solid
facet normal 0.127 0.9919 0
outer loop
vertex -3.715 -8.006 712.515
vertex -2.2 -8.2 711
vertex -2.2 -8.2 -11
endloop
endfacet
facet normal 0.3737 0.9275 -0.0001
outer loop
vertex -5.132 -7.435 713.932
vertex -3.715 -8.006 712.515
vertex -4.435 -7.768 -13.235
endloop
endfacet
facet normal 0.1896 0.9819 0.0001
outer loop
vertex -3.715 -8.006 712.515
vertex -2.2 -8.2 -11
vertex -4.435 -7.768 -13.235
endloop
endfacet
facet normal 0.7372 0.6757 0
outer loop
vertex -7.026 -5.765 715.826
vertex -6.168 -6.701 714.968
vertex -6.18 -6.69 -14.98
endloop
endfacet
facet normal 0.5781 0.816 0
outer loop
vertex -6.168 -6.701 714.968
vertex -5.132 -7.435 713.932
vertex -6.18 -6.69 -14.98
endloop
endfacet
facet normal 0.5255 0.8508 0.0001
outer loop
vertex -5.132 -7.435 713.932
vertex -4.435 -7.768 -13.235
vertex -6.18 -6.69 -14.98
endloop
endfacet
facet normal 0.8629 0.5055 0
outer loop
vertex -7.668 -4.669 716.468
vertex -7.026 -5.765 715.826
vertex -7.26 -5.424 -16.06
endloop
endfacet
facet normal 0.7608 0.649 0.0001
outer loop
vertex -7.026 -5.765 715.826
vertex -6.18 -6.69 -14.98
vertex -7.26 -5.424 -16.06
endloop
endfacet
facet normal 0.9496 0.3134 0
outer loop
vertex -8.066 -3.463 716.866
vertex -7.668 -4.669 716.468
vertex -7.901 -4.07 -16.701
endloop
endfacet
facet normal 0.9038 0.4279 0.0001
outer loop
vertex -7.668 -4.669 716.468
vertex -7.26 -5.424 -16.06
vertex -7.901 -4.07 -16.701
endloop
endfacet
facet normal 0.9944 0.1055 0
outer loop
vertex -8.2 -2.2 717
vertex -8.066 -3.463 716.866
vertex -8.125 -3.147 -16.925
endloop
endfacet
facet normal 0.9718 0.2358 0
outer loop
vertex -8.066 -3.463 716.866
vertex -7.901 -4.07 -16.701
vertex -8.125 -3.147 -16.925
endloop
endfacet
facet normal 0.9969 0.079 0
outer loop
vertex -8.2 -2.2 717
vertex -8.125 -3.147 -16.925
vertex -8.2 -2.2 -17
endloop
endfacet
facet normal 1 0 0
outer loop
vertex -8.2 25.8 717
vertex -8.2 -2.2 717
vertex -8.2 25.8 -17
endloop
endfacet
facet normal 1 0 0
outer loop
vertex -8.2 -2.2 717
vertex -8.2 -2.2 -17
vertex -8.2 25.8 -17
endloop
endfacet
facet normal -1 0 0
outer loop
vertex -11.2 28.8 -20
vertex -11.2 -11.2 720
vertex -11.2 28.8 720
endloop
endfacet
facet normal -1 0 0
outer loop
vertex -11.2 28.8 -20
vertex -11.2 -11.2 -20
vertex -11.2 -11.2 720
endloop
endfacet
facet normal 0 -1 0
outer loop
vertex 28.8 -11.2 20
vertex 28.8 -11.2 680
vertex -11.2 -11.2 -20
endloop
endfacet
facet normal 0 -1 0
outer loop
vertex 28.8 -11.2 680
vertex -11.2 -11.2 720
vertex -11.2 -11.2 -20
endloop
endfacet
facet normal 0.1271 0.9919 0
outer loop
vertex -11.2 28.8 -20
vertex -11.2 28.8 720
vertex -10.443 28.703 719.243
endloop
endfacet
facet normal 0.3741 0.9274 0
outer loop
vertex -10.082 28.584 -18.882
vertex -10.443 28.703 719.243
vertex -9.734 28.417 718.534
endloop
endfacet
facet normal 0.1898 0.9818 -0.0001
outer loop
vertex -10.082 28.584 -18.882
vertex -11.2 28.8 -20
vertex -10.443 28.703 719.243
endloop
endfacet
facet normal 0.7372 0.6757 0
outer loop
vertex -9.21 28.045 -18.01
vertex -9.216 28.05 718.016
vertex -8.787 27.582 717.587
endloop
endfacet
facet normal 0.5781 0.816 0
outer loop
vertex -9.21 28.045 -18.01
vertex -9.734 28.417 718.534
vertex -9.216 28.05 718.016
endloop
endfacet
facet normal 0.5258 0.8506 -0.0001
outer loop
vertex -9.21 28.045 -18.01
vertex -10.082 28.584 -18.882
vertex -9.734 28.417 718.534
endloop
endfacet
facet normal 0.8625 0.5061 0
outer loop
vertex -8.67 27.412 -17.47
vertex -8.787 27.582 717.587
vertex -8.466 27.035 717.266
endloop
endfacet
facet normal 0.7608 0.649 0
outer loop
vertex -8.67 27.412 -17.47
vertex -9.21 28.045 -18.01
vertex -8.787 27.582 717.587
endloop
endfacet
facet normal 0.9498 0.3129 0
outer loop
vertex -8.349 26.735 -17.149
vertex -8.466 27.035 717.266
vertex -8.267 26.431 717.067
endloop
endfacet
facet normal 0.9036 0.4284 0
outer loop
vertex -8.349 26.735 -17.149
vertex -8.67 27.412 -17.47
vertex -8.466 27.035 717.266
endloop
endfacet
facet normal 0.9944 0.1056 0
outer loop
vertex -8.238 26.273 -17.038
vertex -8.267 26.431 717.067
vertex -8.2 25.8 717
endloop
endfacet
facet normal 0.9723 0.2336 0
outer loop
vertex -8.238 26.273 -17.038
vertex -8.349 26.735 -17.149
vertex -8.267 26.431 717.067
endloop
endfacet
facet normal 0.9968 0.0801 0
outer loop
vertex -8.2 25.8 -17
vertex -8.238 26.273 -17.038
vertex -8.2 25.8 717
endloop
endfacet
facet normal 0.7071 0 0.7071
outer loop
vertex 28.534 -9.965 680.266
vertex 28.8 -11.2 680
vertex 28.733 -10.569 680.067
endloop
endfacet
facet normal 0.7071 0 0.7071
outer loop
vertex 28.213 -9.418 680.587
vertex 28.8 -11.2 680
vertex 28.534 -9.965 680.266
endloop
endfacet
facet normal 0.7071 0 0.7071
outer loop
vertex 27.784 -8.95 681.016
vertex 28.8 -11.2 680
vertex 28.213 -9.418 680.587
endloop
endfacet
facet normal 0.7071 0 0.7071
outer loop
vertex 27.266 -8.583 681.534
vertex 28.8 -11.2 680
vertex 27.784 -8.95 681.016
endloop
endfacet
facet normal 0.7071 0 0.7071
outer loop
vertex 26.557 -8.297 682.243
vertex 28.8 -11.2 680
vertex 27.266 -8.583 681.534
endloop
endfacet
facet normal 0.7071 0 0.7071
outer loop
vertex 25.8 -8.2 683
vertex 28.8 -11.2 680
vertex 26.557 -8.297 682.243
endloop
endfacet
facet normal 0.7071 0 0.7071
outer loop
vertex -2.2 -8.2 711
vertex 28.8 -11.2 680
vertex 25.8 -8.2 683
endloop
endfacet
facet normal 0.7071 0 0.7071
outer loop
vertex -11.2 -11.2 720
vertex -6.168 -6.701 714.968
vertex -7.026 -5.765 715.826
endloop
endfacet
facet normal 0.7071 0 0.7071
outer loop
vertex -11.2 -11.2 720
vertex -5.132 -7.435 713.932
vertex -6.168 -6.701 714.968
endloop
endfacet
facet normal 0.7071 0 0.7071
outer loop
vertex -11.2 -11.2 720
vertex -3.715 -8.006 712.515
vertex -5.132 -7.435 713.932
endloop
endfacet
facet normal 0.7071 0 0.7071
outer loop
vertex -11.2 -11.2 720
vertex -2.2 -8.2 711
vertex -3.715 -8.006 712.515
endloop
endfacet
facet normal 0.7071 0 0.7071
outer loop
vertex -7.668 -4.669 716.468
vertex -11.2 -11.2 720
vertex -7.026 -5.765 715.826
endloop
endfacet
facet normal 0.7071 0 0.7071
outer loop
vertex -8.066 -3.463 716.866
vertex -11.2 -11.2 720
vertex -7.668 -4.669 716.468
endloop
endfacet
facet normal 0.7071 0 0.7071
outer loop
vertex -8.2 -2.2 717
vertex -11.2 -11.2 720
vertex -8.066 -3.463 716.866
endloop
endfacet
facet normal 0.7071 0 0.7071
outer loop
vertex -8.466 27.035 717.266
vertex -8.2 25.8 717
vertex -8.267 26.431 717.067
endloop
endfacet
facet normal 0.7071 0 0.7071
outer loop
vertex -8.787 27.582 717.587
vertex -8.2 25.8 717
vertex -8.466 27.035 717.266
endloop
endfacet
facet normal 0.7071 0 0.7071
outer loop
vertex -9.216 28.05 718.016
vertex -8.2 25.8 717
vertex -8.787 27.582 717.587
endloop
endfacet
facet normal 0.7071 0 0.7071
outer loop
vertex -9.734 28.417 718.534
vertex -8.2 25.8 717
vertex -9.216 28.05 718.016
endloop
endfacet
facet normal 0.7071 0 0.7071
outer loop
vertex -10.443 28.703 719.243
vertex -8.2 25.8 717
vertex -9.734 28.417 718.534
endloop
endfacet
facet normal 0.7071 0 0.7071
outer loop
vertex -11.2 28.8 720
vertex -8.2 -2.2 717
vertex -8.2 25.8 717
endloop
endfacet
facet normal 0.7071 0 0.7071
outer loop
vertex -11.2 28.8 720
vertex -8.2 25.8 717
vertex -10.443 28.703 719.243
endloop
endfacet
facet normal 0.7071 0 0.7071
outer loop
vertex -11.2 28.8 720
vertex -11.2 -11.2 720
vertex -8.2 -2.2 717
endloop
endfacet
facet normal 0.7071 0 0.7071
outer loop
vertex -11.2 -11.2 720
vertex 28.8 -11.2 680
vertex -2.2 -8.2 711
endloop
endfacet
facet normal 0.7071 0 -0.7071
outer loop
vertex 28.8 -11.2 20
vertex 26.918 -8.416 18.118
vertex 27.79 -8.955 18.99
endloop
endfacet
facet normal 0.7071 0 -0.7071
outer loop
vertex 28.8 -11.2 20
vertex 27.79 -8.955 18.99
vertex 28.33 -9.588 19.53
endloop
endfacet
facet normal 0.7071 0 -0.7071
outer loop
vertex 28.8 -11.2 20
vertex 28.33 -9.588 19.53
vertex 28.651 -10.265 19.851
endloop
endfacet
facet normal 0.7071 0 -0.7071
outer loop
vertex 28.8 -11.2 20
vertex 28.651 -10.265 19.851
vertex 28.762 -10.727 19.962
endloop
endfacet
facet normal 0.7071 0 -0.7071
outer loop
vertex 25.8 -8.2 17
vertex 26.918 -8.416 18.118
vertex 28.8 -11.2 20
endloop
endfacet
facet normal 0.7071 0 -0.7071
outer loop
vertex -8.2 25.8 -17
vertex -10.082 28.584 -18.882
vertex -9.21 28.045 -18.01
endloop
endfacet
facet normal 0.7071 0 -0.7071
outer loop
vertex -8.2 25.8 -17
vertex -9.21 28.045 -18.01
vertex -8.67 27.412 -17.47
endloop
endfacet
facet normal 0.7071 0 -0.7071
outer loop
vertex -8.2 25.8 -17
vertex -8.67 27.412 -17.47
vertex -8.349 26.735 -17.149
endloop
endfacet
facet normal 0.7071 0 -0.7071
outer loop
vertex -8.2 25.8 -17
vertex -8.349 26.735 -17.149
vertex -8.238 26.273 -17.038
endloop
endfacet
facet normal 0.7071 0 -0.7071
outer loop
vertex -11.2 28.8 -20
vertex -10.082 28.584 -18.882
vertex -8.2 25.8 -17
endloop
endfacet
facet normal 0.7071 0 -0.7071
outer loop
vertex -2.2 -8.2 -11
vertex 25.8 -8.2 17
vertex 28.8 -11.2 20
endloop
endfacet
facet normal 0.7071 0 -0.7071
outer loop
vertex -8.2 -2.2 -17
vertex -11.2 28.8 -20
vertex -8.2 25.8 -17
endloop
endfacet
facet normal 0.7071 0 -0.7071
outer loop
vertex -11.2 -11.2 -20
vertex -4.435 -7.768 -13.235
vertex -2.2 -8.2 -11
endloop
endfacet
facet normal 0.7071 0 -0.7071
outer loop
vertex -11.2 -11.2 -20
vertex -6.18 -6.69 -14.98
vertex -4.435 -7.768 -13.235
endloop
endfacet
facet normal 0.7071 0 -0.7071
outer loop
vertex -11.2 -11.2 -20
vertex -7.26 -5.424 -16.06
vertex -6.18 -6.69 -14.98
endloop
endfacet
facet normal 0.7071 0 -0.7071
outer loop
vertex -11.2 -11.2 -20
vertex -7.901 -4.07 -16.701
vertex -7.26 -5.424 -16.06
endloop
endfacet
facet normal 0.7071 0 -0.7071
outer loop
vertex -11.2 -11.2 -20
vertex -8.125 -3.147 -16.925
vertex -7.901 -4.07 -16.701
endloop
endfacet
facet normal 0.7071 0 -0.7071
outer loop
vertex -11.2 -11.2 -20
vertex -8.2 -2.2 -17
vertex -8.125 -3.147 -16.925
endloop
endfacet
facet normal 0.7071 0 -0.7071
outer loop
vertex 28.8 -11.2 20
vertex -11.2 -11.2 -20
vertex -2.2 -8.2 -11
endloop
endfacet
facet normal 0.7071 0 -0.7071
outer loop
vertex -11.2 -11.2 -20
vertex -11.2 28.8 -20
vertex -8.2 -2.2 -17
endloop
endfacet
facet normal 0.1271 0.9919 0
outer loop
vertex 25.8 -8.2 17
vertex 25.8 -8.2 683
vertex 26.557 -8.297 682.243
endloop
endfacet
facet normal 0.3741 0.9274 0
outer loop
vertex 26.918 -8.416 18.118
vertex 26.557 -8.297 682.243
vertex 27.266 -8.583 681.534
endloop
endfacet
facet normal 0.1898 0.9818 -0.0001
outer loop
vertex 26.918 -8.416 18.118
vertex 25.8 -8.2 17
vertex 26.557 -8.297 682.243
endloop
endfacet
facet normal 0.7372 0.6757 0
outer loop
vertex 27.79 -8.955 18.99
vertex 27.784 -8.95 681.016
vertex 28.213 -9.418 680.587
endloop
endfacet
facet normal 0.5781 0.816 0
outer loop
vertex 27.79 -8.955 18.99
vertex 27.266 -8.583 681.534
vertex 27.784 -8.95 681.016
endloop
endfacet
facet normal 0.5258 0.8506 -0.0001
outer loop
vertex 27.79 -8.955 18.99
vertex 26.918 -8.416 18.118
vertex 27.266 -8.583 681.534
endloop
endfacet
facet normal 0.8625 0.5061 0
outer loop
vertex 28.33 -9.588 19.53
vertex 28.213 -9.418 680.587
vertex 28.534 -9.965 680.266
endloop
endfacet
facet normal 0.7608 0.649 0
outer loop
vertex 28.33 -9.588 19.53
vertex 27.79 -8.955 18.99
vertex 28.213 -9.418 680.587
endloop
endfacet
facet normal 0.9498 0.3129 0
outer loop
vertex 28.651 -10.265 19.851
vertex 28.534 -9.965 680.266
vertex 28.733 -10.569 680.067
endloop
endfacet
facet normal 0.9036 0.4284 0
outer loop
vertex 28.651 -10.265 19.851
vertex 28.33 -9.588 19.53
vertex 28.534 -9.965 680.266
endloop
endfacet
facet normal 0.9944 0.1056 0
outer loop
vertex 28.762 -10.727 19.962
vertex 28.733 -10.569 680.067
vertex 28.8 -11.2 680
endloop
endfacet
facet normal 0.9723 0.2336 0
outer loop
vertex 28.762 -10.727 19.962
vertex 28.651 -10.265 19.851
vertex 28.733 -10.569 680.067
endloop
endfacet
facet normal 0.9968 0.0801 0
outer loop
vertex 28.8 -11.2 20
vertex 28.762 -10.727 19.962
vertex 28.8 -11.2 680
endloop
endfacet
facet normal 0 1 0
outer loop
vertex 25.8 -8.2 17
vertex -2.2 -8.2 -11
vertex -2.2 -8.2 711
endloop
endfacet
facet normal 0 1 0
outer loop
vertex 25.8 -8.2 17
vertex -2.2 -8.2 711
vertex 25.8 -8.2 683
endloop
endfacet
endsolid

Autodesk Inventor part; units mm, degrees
ref_plane "Start plane" through (0, 0, -20) normal (0, 0, 1) x (1, 0, 0)
ref_plane "End plane" through (0, 0, 720) normal (0, 0, 1) x (1, 0, 0)
sketch "Sketch2" plane through (0, 0, 0) normal (0, 0, 1) x (1, 0, 0)
  line L0 (-8.2, -2.2) -> (-8.2, 25.8)
  line L1 (-11.2, 28.8) -> (-11.2, 28.8)
  line L2 (-11.2, -11.2) -> (-11.2, 28.8)
  line L3 (-11.2, -11.2) -> (28.8, -11.2)
  line L4 (28.8, -11.2) -> (28.8, -11.2)
  line L5 (-2.2, -8.2) -> (25.8, -8.2)
  arc A0 (-8.2, -2.2) -> (-2.2, -8.2) centre (-2.2, -2.2) ccw
  arc A1 (-8.2, 25.8) -> (-11.2, 28.8) centre (-11.2, 25.8) ccw
  arc A2 (28.8, -11.2) -> (25.8, -8.2) centre (25.8, -11.2) ccw
  line L6 (0, 37.5456) -> (0, -19.3243) construction
  line L7 (-19.3243, 0) -> (37.5456, 0) construction
  point P0 (-8.2, -8.2)
  point P1 (-8.2, 28.8)
  point P2 (28.8, -8.2)
  dimension "d4" = 40
  dimension "d6" = 40
  dimension "d8" = 3
  dimension "d10" = 3
  dimension "d17" = 6
  dimension "d18" = 3
  dimension "d19" = 11.2
  dimension "d20" = 11.2
extrude "Body" add sketch "Sketch2" along normal up to surface (740 mm away) from surface at -20
sketch "Sketch3" plane through (0, 0, 0) normal (0, 0, 1) x (1, 0, 0)
  line L0 (0, 0) -> (10, 0)
ref_plane "Work Plane10" through (0, 0, 0) normal (0, -1, 0) x (1, 0, 0)
sketch "Sketch4" plane through (0, 0, 0) normal (0, -1, 0) x (1, 0, 0)
  line L0 (-2, -20) -> (12, -20)
  line L1 (-2, 720) -> (12, 720)
  dimension "d24" = 740
ref_plane "Work Plane11" through (-11.2, 8.8, -20) normal (0.7071, 0, -0.7071) x (-0.7071, 0, -0.7071)
split "Split1" plane through (-11.2, 8.8, -20) removes the side toward (0.7071, 0, -0.7071)
ref_plane "Work Plane12" through (-11.2, 8.8, 720) normal (0.7071, 0, 0.7071) x (0.7071, 0, -0.7071)
split "Split2" plane through (-11.2, 8.8, 720) removes the side toward (0.7071, 0, 0.7071)
equation "\"d4\" = b"
equation "\"d6\" = b"
equation "\"d8\" = ParT"
equation "\"d10\" = ParT"
equation "\"d17\" = R"
equation "\"d18\" = R1"
equation "\"d19\" = ex"
equation "\"d20\" = d19"
equation "\"d11\" = G_L"
equation "\"b\" = 40"
equation "\"ParT\" = 3"
equation "\"R\" = 6"
equation "\"R1\" = 3"
equation "\"G_L\" = d24"
equation "\"ex\" = 11.2"
equation "\"G_OFFSET_START\" = 20"
equation "\"G_OFFSET_END\" = 20"
equation "\"d21\" = -G_OFFSET_START"
equation "\"d22\" = G_OFFSET_END + B_L"
equation "\"B_L\" = 700"
properties part number "ISO 657-1 - L40x40x3-740" material "Steel, Mild"
